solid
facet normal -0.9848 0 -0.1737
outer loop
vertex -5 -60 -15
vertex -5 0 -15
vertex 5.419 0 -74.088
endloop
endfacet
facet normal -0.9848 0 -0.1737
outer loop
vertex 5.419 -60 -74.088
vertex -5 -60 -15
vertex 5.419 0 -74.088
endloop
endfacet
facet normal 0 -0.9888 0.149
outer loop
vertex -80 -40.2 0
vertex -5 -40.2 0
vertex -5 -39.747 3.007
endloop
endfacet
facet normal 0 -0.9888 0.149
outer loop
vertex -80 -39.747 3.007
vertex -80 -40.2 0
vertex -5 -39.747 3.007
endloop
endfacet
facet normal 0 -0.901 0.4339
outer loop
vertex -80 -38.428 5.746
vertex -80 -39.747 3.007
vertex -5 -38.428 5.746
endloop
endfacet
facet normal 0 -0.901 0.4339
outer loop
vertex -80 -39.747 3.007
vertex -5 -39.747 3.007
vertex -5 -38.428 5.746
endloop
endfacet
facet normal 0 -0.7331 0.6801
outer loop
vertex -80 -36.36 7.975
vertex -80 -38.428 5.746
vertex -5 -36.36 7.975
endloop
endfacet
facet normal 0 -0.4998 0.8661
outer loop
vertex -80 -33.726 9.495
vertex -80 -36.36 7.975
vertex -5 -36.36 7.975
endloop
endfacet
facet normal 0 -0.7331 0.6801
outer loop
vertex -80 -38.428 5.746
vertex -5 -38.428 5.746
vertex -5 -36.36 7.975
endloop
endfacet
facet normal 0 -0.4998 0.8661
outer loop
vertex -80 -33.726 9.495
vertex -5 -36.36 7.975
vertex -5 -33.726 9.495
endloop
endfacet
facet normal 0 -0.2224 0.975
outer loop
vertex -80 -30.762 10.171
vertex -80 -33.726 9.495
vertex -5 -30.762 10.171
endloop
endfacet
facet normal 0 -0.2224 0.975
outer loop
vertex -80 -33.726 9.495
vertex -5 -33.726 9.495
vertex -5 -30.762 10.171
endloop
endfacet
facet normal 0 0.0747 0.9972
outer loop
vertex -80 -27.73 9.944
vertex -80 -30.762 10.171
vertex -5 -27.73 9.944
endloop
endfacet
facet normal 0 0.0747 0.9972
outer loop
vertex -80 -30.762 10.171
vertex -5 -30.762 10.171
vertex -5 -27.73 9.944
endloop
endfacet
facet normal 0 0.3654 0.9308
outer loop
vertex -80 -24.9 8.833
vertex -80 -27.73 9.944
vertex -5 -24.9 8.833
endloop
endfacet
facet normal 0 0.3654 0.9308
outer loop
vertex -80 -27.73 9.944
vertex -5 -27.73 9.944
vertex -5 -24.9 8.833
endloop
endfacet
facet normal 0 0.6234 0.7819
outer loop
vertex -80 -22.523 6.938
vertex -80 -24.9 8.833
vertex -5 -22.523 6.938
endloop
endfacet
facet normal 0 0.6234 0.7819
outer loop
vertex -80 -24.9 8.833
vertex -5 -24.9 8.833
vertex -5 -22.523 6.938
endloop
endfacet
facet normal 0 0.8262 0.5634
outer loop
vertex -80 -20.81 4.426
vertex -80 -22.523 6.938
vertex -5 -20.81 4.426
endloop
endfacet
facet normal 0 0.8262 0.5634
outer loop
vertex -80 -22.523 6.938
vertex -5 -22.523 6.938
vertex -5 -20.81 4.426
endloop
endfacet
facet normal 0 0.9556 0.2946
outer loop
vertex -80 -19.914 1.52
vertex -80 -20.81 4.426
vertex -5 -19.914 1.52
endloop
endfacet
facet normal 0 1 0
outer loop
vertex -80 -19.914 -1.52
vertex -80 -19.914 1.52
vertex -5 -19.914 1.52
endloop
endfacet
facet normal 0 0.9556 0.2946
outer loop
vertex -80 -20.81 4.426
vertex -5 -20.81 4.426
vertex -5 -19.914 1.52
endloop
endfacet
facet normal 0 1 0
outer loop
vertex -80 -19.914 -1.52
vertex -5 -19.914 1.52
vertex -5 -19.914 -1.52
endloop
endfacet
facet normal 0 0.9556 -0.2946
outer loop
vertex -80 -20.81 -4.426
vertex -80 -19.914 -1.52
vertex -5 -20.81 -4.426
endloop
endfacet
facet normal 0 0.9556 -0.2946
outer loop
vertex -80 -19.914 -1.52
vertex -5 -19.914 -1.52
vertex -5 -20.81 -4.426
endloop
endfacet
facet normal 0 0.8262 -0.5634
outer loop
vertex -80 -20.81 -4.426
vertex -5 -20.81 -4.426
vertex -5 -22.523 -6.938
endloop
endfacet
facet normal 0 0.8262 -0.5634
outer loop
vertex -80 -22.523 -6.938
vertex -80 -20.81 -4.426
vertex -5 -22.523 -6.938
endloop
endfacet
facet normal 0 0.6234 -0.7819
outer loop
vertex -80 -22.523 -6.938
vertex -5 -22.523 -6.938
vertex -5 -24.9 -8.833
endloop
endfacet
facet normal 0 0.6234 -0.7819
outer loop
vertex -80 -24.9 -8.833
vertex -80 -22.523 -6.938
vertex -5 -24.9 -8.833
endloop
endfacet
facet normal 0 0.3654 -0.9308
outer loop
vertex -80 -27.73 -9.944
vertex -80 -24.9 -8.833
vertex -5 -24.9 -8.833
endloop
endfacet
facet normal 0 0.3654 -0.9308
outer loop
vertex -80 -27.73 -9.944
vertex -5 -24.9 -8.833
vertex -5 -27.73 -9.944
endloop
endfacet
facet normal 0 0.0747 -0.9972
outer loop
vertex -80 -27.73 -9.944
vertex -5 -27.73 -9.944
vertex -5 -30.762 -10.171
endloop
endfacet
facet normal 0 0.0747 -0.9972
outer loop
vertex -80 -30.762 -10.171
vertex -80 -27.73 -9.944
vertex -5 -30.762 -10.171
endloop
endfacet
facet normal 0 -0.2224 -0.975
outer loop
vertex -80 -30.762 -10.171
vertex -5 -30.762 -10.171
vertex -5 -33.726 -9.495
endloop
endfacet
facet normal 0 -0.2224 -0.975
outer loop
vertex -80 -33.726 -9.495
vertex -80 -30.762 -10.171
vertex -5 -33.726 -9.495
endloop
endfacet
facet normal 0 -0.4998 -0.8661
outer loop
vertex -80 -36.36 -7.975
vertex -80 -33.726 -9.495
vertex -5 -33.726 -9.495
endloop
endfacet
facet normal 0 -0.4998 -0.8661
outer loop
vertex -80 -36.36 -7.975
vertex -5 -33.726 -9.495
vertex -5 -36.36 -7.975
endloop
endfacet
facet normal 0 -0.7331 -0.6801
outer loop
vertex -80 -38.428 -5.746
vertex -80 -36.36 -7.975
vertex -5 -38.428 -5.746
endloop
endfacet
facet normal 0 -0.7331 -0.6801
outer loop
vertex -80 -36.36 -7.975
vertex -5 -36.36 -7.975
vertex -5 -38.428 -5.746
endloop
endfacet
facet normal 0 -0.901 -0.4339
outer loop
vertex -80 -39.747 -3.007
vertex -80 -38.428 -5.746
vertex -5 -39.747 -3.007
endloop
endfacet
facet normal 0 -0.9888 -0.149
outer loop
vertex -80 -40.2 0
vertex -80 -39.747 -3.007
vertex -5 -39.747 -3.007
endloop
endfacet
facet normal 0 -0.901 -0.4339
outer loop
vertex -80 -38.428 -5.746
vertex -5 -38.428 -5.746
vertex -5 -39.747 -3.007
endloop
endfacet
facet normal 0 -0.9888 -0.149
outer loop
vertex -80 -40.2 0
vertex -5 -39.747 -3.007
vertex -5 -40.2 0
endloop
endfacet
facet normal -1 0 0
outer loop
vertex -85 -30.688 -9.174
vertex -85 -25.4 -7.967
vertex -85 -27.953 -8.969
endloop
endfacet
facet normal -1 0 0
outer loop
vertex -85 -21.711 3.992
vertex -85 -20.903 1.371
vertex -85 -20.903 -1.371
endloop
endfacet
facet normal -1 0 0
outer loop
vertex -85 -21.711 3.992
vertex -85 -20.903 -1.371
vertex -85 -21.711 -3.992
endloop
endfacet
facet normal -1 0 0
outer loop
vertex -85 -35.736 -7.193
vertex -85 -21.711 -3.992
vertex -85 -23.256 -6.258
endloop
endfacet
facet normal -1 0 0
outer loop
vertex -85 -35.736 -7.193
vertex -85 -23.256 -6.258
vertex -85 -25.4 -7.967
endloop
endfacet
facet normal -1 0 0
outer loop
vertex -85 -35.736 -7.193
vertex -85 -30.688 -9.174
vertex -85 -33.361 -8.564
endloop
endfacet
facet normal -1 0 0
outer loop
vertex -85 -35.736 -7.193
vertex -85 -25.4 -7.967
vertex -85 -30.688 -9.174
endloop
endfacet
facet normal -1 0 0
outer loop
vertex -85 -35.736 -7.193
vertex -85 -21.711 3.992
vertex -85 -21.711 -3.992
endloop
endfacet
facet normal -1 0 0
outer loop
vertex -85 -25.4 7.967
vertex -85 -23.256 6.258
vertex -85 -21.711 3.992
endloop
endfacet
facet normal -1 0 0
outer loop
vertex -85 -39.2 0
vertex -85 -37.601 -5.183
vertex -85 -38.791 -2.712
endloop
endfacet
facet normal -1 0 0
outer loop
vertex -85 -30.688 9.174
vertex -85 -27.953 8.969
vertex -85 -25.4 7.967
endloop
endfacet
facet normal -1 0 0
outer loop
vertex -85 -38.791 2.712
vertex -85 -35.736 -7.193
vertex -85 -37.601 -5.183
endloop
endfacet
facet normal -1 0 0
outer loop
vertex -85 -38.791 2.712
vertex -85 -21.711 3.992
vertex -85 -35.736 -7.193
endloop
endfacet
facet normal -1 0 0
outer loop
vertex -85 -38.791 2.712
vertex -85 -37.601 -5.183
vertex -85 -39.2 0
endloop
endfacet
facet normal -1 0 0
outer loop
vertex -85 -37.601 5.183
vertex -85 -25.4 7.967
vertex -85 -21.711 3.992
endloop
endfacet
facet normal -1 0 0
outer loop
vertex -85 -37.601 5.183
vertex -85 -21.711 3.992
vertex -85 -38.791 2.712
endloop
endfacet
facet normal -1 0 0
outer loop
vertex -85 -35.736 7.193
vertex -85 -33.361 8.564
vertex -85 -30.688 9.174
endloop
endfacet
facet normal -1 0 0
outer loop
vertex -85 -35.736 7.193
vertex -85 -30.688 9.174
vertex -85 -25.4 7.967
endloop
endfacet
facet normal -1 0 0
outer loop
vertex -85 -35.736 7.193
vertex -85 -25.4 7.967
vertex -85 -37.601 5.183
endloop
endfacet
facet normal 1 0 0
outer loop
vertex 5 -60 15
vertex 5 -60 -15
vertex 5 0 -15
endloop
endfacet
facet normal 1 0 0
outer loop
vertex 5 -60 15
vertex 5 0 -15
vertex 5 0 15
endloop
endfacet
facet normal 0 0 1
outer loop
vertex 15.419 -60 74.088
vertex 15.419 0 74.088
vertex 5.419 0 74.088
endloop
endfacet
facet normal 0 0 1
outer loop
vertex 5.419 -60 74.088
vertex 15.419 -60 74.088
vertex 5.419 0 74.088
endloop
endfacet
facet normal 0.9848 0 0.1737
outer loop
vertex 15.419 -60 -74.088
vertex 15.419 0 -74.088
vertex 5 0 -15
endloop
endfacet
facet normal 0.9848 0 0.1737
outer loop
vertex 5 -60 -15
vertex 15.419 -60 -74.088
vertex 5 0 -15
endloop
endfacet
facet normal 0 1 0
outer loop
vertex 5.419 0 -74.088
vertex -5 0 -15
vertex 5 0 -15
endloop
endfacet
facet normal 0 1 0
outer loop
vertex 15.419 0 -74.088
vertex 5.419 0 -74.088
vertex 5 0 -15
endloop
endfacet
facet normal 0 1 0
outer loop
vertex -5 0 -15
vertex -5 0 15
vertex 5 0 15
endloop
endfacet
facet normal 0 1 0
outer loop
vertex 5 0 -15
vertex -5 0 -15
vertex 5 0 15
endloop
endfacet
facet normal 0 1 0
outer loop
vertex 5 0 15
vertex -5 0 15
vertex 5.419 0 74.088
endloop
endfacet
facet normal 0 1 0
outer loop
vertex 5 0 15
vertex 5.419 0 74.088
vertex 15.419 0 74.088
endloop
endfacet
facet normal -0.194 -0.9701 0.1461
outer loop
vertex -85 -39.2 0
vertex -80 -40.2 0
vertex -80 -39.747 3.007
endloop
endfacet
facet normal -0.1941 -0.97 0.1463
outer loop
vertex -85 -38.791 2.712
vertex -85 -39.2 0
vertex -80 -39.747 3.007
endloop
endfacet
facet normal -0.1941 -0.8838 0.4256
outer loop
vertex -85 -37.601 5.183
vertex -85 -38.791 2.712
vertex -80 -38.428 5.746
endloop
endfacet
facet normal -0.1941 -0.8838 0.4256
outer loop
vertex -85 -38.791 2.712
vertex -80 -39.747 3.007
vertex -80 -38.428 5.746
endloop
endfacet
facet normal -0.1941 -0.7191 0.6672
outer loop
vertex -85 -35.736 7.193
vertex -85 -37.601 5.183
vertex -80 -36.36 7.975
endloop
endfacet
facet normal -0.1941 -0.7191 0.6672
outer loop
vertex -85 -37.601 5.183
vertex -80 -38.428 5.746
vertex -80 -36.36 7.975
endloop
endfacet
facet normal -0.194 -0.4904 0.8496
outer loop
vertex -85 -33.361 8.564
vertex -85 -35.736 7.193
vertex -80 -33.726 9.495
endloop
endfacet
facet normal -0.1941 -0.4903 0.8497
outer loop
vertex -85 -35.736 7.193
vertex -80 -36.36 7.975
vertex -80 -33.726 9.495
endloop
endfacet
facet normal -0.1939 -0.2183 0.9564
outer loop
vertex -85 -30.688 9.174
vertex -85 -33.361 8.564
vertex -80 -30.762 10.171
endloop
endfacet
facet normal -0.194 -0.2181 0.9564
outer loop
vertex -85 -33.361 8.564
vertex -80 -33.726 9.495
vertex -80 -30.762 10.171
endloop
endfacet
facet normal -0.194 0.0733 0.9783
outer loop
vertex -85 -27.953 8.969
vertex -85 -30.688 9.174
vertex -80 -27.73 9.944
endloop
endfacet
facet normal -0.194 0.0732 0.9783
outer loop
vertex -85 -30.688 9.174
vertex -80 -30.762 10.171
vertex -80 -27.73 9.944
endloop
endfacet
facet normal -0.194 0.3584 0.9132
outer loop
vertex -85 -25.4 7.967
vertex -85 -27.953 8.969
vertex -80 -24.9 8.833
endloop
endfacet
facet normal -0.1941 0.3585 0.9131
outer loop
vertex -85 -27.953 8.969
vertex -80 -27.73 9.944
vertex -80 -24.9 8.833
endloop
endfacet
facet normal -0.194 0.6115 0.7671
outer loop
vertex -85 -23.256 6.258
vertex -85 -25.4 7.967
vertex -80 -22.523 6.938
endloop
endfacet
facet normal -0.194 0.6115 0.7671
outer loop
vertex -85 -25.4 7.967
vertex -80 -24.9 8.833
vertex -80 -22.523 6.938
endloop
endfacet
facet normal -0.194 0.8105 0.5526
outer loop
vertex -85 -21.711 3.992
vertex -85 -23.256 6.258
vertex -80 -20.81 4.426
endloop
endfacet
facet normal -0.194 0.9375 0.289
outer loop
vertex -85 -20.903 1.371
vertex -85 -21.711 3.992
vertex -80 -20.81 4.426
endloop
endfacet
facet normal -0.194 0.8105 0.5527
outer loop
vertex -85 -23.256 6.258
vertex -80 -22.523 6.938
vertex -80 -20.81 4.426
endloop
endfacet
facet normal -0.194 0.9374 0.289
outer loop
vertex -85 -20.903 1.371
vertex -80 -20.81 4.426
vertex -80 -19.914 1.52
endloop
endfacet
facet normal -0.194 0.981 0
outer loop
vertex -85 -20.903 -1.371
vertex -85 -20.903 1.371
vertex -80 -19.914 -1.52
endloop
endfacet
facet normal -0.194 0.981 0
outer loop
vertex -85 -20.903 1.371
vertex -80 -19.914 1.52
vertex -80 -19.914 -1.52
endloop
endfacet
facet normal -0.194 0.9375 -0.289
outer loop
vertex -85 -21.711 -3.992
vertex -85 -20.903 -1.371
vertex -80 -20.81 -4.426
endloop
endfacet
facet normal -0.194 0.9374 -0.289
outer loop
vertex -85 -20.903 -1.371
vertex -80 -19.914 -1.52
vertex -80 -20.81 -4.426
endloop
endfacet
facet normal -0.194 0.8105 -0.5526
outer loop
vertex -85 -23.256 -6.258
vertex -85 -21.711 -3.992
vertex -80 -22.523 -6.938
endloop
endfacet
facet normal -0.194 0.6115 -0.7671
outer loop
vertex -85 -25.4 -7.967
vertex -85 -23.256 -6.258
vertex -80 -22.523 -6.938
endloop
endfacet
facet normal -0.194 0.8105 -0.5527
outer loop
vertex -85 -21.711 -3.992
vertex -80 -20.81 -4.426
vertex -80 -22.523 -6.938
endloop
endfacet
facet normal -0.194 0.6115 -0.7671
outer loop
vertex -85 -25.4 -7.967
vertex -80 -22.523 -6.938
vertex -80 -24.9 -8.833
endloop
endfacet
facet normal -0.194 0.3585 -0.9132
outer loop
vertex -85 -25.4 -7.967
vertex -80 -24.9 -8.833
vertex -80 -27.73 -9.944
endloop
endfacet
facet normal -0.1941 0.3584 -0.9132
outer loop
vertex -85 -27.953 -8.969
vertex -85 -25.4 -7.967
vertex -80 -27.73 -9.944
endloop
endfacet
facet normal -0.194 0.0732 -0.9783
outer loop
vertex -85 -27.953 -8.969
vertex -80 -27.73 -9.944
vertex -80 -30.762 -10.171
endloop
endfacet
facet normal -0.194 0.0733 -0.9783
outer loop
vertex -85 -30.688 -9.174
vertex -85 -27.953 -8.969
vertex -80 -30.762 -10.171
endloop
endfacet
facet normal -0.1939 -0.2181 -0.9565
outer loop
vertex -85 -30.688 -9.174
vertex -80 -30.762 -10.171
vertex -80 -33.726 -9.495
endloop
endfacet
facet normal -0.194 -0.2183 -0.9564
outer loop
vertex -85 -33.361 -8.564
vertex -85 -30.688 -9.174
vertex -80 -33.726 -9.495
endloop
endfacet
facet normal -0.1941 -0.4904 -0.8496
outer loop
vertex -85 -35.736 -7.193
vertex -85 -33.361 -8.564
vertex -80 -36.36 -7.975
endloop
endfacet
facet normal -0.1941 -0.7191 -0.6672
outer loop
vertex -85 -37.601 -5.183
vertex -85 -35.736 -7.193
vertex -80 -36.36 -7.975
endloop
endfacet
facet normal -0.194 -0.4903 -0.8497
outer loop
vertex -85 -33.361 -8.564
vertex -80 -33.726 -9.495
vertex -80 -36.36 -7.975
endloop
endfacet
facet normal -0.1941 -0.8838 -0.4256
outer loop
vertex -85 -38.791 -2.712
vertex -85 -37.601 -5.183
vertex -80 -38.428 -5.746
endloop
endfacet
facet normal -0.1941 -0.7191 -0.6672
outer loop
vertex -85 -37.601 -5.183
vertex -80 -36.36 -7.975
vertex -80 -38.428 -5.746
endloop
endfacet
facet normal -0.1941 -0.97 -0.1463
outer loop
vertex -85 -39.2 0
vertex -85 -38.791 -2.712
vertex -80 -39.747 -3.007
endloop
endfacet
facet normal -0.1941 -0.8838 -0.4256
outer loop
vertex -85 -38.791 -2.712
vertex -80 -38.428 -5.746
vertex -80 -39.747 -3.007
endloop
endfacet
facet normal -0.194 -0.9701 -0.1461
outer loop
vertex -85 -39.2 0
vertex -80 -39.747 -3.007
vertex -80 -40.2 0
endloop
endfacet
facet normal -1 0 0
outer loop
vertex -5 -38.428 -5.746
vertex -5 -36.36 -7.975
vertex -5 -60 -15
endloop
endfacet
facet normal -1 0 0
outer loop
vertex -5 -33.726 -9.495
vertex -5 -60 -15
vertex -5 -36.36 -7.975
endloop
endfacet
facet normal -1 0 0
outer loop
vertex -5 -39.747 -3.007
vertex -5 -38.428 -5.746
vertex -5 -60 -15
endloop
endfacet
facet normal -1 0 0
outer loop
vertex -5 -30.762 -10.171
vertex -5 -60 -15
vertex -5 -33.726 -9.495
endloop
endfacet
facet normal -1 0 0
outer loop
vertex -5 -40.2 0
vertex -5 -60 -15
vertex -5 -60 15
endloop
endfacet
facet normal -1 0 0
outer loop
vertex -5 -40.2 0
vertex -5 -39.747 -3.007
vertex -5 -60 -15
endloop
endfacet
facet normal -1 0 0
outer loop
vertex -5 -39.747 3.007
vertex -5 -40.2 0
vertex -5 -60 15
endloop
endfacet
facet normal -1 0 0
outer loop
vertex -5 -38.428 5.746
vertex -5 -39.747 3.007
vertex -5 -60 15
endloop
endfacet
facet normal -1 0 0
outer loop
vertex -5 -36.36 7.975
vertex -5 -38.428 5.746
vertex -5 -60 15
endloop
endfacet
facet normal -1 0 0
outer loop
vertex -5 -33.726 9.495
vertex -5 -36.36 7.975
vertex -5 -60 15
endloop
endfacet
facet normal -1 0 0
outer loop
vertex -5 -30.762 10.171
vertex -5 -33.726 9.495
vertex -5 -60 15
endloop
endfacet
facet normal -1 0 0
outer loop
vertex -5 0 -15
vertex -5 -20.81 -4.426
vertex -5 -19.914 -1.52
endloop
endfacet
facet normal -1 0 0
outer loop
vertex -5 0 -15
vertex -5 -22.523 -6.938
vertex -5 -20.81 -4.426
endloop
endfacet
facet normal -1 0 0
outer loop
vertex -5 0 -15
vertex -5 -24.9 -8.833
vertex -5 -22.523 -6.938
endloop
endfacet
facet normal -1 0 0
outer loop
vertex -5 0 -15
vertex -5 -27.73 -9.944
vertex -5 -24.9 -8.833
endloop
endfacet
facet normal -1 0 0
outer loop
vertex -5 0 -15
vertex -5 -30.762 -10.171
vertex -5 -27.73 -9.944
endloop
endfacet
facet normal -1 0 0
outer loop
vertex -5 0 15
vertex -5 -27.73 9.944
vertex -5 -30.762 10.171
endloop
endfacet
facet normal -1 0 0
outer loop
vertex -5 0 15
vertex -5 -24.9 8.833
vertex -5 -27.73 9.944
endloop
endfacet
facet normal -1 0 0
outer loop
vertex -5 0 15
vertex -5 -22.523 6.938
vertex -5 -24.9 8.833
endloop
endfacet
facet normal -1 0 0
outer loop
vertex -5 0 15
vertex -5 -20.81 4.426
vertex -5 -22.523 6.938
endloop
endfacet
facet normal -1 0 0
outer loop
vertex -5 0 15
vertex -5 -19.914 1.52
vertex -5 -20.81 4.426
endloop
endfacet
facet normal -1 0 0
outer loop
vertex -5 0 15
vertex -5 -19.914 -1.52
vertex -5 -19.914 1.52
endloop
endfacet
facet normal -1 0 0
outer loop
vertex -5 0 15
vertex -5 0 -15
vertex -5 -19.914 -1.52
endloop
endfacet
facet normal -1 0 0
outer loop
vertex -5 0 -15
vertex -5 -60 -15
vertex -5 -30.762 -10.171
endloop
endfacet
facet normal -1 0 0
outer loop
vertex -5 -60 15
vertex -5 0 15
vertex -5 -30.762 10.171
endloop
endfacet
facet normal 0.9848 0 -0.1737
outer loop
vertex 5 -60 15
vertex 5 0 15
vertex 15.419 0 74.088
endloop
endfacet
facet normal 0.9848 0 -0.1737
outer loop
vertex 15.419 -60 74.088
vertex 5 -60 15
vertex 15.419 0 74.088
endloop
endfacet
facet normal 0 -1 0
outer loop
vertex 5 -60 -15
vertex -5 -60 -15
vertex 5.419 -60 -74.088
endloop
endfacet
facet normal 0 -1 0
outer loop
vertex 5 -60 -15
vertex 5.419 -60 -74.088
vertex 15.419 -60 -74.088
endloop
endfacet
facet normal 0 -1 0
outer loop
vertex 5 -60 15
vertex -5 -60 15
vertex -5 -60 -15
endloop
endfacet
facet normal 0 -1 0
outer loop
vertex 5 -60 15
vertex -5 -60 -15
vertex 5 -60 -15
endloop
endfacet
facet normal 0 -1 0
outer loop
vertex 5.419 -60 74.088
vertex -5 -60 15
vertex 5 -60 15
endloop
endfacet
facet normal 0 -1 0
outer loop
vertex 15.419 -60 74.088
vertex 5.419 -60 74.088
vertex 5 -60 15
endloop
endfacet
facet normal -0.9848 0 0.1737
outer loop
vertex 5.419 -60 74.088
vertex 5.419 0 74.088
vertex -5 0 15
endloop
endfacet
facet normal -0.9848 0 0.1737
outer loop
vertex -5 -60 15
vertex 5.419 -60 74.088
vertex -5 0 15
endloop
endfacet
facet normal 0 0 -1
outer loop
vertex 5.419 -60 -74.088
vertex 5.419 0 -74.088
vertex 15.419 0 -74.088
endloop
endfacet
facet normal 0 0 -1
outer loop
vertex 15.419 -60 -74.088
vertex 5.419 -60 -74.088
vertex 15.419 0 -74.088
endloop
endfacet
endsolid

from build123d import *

# Parameters (mm, degrees)
F0_W     = 10
F0_H     = 30
F1_DEPTH = 60
F2_R     = 10.2
F3_DEPTH = 80
F4_SIZE2 = 5
F4_SIZE  = 1


with BuildPart() as f1:
    # F0 (on Front) → F1 (new body)
    with BuildSketch(Plane.XZ):
        Polygon((5.41889066, 74.0884651807), (-5, 15), (5, 15), (15.41889066, 74.0884651807), align=None)
        Rectangle(F0_W, F0_H)
        Polygon((5, -15), (-5, -15), (5.41889066, -74.0884651807), (15.41889066, -74.0884651807), align=None)
    extrude(amount=F1_DEPTH)

    # F2 (on face) → F3 (join)
    with BuildSketch(Plane(origin=(-5, 0, 0), x_dir=(0, -1, 0), z_dir=(-1, 0, 0))):
        with Locations((30, 0)):
            Circle(F2_R)
    extrude(amount=F3_DEPTH)

    # F4
    f4_edges = [f1.edges().sort_by_distance(p)[0] for p in [
        (-85, -19.8, 0),
    ]]
    f4_side = f1.faces().sort_by_distance((-85, -30, 0))[0]
    chamfer(f4_edges, length=F4_SIZE, length2=F4_SIZE2, reference=f4_side)


solid = f1.part
